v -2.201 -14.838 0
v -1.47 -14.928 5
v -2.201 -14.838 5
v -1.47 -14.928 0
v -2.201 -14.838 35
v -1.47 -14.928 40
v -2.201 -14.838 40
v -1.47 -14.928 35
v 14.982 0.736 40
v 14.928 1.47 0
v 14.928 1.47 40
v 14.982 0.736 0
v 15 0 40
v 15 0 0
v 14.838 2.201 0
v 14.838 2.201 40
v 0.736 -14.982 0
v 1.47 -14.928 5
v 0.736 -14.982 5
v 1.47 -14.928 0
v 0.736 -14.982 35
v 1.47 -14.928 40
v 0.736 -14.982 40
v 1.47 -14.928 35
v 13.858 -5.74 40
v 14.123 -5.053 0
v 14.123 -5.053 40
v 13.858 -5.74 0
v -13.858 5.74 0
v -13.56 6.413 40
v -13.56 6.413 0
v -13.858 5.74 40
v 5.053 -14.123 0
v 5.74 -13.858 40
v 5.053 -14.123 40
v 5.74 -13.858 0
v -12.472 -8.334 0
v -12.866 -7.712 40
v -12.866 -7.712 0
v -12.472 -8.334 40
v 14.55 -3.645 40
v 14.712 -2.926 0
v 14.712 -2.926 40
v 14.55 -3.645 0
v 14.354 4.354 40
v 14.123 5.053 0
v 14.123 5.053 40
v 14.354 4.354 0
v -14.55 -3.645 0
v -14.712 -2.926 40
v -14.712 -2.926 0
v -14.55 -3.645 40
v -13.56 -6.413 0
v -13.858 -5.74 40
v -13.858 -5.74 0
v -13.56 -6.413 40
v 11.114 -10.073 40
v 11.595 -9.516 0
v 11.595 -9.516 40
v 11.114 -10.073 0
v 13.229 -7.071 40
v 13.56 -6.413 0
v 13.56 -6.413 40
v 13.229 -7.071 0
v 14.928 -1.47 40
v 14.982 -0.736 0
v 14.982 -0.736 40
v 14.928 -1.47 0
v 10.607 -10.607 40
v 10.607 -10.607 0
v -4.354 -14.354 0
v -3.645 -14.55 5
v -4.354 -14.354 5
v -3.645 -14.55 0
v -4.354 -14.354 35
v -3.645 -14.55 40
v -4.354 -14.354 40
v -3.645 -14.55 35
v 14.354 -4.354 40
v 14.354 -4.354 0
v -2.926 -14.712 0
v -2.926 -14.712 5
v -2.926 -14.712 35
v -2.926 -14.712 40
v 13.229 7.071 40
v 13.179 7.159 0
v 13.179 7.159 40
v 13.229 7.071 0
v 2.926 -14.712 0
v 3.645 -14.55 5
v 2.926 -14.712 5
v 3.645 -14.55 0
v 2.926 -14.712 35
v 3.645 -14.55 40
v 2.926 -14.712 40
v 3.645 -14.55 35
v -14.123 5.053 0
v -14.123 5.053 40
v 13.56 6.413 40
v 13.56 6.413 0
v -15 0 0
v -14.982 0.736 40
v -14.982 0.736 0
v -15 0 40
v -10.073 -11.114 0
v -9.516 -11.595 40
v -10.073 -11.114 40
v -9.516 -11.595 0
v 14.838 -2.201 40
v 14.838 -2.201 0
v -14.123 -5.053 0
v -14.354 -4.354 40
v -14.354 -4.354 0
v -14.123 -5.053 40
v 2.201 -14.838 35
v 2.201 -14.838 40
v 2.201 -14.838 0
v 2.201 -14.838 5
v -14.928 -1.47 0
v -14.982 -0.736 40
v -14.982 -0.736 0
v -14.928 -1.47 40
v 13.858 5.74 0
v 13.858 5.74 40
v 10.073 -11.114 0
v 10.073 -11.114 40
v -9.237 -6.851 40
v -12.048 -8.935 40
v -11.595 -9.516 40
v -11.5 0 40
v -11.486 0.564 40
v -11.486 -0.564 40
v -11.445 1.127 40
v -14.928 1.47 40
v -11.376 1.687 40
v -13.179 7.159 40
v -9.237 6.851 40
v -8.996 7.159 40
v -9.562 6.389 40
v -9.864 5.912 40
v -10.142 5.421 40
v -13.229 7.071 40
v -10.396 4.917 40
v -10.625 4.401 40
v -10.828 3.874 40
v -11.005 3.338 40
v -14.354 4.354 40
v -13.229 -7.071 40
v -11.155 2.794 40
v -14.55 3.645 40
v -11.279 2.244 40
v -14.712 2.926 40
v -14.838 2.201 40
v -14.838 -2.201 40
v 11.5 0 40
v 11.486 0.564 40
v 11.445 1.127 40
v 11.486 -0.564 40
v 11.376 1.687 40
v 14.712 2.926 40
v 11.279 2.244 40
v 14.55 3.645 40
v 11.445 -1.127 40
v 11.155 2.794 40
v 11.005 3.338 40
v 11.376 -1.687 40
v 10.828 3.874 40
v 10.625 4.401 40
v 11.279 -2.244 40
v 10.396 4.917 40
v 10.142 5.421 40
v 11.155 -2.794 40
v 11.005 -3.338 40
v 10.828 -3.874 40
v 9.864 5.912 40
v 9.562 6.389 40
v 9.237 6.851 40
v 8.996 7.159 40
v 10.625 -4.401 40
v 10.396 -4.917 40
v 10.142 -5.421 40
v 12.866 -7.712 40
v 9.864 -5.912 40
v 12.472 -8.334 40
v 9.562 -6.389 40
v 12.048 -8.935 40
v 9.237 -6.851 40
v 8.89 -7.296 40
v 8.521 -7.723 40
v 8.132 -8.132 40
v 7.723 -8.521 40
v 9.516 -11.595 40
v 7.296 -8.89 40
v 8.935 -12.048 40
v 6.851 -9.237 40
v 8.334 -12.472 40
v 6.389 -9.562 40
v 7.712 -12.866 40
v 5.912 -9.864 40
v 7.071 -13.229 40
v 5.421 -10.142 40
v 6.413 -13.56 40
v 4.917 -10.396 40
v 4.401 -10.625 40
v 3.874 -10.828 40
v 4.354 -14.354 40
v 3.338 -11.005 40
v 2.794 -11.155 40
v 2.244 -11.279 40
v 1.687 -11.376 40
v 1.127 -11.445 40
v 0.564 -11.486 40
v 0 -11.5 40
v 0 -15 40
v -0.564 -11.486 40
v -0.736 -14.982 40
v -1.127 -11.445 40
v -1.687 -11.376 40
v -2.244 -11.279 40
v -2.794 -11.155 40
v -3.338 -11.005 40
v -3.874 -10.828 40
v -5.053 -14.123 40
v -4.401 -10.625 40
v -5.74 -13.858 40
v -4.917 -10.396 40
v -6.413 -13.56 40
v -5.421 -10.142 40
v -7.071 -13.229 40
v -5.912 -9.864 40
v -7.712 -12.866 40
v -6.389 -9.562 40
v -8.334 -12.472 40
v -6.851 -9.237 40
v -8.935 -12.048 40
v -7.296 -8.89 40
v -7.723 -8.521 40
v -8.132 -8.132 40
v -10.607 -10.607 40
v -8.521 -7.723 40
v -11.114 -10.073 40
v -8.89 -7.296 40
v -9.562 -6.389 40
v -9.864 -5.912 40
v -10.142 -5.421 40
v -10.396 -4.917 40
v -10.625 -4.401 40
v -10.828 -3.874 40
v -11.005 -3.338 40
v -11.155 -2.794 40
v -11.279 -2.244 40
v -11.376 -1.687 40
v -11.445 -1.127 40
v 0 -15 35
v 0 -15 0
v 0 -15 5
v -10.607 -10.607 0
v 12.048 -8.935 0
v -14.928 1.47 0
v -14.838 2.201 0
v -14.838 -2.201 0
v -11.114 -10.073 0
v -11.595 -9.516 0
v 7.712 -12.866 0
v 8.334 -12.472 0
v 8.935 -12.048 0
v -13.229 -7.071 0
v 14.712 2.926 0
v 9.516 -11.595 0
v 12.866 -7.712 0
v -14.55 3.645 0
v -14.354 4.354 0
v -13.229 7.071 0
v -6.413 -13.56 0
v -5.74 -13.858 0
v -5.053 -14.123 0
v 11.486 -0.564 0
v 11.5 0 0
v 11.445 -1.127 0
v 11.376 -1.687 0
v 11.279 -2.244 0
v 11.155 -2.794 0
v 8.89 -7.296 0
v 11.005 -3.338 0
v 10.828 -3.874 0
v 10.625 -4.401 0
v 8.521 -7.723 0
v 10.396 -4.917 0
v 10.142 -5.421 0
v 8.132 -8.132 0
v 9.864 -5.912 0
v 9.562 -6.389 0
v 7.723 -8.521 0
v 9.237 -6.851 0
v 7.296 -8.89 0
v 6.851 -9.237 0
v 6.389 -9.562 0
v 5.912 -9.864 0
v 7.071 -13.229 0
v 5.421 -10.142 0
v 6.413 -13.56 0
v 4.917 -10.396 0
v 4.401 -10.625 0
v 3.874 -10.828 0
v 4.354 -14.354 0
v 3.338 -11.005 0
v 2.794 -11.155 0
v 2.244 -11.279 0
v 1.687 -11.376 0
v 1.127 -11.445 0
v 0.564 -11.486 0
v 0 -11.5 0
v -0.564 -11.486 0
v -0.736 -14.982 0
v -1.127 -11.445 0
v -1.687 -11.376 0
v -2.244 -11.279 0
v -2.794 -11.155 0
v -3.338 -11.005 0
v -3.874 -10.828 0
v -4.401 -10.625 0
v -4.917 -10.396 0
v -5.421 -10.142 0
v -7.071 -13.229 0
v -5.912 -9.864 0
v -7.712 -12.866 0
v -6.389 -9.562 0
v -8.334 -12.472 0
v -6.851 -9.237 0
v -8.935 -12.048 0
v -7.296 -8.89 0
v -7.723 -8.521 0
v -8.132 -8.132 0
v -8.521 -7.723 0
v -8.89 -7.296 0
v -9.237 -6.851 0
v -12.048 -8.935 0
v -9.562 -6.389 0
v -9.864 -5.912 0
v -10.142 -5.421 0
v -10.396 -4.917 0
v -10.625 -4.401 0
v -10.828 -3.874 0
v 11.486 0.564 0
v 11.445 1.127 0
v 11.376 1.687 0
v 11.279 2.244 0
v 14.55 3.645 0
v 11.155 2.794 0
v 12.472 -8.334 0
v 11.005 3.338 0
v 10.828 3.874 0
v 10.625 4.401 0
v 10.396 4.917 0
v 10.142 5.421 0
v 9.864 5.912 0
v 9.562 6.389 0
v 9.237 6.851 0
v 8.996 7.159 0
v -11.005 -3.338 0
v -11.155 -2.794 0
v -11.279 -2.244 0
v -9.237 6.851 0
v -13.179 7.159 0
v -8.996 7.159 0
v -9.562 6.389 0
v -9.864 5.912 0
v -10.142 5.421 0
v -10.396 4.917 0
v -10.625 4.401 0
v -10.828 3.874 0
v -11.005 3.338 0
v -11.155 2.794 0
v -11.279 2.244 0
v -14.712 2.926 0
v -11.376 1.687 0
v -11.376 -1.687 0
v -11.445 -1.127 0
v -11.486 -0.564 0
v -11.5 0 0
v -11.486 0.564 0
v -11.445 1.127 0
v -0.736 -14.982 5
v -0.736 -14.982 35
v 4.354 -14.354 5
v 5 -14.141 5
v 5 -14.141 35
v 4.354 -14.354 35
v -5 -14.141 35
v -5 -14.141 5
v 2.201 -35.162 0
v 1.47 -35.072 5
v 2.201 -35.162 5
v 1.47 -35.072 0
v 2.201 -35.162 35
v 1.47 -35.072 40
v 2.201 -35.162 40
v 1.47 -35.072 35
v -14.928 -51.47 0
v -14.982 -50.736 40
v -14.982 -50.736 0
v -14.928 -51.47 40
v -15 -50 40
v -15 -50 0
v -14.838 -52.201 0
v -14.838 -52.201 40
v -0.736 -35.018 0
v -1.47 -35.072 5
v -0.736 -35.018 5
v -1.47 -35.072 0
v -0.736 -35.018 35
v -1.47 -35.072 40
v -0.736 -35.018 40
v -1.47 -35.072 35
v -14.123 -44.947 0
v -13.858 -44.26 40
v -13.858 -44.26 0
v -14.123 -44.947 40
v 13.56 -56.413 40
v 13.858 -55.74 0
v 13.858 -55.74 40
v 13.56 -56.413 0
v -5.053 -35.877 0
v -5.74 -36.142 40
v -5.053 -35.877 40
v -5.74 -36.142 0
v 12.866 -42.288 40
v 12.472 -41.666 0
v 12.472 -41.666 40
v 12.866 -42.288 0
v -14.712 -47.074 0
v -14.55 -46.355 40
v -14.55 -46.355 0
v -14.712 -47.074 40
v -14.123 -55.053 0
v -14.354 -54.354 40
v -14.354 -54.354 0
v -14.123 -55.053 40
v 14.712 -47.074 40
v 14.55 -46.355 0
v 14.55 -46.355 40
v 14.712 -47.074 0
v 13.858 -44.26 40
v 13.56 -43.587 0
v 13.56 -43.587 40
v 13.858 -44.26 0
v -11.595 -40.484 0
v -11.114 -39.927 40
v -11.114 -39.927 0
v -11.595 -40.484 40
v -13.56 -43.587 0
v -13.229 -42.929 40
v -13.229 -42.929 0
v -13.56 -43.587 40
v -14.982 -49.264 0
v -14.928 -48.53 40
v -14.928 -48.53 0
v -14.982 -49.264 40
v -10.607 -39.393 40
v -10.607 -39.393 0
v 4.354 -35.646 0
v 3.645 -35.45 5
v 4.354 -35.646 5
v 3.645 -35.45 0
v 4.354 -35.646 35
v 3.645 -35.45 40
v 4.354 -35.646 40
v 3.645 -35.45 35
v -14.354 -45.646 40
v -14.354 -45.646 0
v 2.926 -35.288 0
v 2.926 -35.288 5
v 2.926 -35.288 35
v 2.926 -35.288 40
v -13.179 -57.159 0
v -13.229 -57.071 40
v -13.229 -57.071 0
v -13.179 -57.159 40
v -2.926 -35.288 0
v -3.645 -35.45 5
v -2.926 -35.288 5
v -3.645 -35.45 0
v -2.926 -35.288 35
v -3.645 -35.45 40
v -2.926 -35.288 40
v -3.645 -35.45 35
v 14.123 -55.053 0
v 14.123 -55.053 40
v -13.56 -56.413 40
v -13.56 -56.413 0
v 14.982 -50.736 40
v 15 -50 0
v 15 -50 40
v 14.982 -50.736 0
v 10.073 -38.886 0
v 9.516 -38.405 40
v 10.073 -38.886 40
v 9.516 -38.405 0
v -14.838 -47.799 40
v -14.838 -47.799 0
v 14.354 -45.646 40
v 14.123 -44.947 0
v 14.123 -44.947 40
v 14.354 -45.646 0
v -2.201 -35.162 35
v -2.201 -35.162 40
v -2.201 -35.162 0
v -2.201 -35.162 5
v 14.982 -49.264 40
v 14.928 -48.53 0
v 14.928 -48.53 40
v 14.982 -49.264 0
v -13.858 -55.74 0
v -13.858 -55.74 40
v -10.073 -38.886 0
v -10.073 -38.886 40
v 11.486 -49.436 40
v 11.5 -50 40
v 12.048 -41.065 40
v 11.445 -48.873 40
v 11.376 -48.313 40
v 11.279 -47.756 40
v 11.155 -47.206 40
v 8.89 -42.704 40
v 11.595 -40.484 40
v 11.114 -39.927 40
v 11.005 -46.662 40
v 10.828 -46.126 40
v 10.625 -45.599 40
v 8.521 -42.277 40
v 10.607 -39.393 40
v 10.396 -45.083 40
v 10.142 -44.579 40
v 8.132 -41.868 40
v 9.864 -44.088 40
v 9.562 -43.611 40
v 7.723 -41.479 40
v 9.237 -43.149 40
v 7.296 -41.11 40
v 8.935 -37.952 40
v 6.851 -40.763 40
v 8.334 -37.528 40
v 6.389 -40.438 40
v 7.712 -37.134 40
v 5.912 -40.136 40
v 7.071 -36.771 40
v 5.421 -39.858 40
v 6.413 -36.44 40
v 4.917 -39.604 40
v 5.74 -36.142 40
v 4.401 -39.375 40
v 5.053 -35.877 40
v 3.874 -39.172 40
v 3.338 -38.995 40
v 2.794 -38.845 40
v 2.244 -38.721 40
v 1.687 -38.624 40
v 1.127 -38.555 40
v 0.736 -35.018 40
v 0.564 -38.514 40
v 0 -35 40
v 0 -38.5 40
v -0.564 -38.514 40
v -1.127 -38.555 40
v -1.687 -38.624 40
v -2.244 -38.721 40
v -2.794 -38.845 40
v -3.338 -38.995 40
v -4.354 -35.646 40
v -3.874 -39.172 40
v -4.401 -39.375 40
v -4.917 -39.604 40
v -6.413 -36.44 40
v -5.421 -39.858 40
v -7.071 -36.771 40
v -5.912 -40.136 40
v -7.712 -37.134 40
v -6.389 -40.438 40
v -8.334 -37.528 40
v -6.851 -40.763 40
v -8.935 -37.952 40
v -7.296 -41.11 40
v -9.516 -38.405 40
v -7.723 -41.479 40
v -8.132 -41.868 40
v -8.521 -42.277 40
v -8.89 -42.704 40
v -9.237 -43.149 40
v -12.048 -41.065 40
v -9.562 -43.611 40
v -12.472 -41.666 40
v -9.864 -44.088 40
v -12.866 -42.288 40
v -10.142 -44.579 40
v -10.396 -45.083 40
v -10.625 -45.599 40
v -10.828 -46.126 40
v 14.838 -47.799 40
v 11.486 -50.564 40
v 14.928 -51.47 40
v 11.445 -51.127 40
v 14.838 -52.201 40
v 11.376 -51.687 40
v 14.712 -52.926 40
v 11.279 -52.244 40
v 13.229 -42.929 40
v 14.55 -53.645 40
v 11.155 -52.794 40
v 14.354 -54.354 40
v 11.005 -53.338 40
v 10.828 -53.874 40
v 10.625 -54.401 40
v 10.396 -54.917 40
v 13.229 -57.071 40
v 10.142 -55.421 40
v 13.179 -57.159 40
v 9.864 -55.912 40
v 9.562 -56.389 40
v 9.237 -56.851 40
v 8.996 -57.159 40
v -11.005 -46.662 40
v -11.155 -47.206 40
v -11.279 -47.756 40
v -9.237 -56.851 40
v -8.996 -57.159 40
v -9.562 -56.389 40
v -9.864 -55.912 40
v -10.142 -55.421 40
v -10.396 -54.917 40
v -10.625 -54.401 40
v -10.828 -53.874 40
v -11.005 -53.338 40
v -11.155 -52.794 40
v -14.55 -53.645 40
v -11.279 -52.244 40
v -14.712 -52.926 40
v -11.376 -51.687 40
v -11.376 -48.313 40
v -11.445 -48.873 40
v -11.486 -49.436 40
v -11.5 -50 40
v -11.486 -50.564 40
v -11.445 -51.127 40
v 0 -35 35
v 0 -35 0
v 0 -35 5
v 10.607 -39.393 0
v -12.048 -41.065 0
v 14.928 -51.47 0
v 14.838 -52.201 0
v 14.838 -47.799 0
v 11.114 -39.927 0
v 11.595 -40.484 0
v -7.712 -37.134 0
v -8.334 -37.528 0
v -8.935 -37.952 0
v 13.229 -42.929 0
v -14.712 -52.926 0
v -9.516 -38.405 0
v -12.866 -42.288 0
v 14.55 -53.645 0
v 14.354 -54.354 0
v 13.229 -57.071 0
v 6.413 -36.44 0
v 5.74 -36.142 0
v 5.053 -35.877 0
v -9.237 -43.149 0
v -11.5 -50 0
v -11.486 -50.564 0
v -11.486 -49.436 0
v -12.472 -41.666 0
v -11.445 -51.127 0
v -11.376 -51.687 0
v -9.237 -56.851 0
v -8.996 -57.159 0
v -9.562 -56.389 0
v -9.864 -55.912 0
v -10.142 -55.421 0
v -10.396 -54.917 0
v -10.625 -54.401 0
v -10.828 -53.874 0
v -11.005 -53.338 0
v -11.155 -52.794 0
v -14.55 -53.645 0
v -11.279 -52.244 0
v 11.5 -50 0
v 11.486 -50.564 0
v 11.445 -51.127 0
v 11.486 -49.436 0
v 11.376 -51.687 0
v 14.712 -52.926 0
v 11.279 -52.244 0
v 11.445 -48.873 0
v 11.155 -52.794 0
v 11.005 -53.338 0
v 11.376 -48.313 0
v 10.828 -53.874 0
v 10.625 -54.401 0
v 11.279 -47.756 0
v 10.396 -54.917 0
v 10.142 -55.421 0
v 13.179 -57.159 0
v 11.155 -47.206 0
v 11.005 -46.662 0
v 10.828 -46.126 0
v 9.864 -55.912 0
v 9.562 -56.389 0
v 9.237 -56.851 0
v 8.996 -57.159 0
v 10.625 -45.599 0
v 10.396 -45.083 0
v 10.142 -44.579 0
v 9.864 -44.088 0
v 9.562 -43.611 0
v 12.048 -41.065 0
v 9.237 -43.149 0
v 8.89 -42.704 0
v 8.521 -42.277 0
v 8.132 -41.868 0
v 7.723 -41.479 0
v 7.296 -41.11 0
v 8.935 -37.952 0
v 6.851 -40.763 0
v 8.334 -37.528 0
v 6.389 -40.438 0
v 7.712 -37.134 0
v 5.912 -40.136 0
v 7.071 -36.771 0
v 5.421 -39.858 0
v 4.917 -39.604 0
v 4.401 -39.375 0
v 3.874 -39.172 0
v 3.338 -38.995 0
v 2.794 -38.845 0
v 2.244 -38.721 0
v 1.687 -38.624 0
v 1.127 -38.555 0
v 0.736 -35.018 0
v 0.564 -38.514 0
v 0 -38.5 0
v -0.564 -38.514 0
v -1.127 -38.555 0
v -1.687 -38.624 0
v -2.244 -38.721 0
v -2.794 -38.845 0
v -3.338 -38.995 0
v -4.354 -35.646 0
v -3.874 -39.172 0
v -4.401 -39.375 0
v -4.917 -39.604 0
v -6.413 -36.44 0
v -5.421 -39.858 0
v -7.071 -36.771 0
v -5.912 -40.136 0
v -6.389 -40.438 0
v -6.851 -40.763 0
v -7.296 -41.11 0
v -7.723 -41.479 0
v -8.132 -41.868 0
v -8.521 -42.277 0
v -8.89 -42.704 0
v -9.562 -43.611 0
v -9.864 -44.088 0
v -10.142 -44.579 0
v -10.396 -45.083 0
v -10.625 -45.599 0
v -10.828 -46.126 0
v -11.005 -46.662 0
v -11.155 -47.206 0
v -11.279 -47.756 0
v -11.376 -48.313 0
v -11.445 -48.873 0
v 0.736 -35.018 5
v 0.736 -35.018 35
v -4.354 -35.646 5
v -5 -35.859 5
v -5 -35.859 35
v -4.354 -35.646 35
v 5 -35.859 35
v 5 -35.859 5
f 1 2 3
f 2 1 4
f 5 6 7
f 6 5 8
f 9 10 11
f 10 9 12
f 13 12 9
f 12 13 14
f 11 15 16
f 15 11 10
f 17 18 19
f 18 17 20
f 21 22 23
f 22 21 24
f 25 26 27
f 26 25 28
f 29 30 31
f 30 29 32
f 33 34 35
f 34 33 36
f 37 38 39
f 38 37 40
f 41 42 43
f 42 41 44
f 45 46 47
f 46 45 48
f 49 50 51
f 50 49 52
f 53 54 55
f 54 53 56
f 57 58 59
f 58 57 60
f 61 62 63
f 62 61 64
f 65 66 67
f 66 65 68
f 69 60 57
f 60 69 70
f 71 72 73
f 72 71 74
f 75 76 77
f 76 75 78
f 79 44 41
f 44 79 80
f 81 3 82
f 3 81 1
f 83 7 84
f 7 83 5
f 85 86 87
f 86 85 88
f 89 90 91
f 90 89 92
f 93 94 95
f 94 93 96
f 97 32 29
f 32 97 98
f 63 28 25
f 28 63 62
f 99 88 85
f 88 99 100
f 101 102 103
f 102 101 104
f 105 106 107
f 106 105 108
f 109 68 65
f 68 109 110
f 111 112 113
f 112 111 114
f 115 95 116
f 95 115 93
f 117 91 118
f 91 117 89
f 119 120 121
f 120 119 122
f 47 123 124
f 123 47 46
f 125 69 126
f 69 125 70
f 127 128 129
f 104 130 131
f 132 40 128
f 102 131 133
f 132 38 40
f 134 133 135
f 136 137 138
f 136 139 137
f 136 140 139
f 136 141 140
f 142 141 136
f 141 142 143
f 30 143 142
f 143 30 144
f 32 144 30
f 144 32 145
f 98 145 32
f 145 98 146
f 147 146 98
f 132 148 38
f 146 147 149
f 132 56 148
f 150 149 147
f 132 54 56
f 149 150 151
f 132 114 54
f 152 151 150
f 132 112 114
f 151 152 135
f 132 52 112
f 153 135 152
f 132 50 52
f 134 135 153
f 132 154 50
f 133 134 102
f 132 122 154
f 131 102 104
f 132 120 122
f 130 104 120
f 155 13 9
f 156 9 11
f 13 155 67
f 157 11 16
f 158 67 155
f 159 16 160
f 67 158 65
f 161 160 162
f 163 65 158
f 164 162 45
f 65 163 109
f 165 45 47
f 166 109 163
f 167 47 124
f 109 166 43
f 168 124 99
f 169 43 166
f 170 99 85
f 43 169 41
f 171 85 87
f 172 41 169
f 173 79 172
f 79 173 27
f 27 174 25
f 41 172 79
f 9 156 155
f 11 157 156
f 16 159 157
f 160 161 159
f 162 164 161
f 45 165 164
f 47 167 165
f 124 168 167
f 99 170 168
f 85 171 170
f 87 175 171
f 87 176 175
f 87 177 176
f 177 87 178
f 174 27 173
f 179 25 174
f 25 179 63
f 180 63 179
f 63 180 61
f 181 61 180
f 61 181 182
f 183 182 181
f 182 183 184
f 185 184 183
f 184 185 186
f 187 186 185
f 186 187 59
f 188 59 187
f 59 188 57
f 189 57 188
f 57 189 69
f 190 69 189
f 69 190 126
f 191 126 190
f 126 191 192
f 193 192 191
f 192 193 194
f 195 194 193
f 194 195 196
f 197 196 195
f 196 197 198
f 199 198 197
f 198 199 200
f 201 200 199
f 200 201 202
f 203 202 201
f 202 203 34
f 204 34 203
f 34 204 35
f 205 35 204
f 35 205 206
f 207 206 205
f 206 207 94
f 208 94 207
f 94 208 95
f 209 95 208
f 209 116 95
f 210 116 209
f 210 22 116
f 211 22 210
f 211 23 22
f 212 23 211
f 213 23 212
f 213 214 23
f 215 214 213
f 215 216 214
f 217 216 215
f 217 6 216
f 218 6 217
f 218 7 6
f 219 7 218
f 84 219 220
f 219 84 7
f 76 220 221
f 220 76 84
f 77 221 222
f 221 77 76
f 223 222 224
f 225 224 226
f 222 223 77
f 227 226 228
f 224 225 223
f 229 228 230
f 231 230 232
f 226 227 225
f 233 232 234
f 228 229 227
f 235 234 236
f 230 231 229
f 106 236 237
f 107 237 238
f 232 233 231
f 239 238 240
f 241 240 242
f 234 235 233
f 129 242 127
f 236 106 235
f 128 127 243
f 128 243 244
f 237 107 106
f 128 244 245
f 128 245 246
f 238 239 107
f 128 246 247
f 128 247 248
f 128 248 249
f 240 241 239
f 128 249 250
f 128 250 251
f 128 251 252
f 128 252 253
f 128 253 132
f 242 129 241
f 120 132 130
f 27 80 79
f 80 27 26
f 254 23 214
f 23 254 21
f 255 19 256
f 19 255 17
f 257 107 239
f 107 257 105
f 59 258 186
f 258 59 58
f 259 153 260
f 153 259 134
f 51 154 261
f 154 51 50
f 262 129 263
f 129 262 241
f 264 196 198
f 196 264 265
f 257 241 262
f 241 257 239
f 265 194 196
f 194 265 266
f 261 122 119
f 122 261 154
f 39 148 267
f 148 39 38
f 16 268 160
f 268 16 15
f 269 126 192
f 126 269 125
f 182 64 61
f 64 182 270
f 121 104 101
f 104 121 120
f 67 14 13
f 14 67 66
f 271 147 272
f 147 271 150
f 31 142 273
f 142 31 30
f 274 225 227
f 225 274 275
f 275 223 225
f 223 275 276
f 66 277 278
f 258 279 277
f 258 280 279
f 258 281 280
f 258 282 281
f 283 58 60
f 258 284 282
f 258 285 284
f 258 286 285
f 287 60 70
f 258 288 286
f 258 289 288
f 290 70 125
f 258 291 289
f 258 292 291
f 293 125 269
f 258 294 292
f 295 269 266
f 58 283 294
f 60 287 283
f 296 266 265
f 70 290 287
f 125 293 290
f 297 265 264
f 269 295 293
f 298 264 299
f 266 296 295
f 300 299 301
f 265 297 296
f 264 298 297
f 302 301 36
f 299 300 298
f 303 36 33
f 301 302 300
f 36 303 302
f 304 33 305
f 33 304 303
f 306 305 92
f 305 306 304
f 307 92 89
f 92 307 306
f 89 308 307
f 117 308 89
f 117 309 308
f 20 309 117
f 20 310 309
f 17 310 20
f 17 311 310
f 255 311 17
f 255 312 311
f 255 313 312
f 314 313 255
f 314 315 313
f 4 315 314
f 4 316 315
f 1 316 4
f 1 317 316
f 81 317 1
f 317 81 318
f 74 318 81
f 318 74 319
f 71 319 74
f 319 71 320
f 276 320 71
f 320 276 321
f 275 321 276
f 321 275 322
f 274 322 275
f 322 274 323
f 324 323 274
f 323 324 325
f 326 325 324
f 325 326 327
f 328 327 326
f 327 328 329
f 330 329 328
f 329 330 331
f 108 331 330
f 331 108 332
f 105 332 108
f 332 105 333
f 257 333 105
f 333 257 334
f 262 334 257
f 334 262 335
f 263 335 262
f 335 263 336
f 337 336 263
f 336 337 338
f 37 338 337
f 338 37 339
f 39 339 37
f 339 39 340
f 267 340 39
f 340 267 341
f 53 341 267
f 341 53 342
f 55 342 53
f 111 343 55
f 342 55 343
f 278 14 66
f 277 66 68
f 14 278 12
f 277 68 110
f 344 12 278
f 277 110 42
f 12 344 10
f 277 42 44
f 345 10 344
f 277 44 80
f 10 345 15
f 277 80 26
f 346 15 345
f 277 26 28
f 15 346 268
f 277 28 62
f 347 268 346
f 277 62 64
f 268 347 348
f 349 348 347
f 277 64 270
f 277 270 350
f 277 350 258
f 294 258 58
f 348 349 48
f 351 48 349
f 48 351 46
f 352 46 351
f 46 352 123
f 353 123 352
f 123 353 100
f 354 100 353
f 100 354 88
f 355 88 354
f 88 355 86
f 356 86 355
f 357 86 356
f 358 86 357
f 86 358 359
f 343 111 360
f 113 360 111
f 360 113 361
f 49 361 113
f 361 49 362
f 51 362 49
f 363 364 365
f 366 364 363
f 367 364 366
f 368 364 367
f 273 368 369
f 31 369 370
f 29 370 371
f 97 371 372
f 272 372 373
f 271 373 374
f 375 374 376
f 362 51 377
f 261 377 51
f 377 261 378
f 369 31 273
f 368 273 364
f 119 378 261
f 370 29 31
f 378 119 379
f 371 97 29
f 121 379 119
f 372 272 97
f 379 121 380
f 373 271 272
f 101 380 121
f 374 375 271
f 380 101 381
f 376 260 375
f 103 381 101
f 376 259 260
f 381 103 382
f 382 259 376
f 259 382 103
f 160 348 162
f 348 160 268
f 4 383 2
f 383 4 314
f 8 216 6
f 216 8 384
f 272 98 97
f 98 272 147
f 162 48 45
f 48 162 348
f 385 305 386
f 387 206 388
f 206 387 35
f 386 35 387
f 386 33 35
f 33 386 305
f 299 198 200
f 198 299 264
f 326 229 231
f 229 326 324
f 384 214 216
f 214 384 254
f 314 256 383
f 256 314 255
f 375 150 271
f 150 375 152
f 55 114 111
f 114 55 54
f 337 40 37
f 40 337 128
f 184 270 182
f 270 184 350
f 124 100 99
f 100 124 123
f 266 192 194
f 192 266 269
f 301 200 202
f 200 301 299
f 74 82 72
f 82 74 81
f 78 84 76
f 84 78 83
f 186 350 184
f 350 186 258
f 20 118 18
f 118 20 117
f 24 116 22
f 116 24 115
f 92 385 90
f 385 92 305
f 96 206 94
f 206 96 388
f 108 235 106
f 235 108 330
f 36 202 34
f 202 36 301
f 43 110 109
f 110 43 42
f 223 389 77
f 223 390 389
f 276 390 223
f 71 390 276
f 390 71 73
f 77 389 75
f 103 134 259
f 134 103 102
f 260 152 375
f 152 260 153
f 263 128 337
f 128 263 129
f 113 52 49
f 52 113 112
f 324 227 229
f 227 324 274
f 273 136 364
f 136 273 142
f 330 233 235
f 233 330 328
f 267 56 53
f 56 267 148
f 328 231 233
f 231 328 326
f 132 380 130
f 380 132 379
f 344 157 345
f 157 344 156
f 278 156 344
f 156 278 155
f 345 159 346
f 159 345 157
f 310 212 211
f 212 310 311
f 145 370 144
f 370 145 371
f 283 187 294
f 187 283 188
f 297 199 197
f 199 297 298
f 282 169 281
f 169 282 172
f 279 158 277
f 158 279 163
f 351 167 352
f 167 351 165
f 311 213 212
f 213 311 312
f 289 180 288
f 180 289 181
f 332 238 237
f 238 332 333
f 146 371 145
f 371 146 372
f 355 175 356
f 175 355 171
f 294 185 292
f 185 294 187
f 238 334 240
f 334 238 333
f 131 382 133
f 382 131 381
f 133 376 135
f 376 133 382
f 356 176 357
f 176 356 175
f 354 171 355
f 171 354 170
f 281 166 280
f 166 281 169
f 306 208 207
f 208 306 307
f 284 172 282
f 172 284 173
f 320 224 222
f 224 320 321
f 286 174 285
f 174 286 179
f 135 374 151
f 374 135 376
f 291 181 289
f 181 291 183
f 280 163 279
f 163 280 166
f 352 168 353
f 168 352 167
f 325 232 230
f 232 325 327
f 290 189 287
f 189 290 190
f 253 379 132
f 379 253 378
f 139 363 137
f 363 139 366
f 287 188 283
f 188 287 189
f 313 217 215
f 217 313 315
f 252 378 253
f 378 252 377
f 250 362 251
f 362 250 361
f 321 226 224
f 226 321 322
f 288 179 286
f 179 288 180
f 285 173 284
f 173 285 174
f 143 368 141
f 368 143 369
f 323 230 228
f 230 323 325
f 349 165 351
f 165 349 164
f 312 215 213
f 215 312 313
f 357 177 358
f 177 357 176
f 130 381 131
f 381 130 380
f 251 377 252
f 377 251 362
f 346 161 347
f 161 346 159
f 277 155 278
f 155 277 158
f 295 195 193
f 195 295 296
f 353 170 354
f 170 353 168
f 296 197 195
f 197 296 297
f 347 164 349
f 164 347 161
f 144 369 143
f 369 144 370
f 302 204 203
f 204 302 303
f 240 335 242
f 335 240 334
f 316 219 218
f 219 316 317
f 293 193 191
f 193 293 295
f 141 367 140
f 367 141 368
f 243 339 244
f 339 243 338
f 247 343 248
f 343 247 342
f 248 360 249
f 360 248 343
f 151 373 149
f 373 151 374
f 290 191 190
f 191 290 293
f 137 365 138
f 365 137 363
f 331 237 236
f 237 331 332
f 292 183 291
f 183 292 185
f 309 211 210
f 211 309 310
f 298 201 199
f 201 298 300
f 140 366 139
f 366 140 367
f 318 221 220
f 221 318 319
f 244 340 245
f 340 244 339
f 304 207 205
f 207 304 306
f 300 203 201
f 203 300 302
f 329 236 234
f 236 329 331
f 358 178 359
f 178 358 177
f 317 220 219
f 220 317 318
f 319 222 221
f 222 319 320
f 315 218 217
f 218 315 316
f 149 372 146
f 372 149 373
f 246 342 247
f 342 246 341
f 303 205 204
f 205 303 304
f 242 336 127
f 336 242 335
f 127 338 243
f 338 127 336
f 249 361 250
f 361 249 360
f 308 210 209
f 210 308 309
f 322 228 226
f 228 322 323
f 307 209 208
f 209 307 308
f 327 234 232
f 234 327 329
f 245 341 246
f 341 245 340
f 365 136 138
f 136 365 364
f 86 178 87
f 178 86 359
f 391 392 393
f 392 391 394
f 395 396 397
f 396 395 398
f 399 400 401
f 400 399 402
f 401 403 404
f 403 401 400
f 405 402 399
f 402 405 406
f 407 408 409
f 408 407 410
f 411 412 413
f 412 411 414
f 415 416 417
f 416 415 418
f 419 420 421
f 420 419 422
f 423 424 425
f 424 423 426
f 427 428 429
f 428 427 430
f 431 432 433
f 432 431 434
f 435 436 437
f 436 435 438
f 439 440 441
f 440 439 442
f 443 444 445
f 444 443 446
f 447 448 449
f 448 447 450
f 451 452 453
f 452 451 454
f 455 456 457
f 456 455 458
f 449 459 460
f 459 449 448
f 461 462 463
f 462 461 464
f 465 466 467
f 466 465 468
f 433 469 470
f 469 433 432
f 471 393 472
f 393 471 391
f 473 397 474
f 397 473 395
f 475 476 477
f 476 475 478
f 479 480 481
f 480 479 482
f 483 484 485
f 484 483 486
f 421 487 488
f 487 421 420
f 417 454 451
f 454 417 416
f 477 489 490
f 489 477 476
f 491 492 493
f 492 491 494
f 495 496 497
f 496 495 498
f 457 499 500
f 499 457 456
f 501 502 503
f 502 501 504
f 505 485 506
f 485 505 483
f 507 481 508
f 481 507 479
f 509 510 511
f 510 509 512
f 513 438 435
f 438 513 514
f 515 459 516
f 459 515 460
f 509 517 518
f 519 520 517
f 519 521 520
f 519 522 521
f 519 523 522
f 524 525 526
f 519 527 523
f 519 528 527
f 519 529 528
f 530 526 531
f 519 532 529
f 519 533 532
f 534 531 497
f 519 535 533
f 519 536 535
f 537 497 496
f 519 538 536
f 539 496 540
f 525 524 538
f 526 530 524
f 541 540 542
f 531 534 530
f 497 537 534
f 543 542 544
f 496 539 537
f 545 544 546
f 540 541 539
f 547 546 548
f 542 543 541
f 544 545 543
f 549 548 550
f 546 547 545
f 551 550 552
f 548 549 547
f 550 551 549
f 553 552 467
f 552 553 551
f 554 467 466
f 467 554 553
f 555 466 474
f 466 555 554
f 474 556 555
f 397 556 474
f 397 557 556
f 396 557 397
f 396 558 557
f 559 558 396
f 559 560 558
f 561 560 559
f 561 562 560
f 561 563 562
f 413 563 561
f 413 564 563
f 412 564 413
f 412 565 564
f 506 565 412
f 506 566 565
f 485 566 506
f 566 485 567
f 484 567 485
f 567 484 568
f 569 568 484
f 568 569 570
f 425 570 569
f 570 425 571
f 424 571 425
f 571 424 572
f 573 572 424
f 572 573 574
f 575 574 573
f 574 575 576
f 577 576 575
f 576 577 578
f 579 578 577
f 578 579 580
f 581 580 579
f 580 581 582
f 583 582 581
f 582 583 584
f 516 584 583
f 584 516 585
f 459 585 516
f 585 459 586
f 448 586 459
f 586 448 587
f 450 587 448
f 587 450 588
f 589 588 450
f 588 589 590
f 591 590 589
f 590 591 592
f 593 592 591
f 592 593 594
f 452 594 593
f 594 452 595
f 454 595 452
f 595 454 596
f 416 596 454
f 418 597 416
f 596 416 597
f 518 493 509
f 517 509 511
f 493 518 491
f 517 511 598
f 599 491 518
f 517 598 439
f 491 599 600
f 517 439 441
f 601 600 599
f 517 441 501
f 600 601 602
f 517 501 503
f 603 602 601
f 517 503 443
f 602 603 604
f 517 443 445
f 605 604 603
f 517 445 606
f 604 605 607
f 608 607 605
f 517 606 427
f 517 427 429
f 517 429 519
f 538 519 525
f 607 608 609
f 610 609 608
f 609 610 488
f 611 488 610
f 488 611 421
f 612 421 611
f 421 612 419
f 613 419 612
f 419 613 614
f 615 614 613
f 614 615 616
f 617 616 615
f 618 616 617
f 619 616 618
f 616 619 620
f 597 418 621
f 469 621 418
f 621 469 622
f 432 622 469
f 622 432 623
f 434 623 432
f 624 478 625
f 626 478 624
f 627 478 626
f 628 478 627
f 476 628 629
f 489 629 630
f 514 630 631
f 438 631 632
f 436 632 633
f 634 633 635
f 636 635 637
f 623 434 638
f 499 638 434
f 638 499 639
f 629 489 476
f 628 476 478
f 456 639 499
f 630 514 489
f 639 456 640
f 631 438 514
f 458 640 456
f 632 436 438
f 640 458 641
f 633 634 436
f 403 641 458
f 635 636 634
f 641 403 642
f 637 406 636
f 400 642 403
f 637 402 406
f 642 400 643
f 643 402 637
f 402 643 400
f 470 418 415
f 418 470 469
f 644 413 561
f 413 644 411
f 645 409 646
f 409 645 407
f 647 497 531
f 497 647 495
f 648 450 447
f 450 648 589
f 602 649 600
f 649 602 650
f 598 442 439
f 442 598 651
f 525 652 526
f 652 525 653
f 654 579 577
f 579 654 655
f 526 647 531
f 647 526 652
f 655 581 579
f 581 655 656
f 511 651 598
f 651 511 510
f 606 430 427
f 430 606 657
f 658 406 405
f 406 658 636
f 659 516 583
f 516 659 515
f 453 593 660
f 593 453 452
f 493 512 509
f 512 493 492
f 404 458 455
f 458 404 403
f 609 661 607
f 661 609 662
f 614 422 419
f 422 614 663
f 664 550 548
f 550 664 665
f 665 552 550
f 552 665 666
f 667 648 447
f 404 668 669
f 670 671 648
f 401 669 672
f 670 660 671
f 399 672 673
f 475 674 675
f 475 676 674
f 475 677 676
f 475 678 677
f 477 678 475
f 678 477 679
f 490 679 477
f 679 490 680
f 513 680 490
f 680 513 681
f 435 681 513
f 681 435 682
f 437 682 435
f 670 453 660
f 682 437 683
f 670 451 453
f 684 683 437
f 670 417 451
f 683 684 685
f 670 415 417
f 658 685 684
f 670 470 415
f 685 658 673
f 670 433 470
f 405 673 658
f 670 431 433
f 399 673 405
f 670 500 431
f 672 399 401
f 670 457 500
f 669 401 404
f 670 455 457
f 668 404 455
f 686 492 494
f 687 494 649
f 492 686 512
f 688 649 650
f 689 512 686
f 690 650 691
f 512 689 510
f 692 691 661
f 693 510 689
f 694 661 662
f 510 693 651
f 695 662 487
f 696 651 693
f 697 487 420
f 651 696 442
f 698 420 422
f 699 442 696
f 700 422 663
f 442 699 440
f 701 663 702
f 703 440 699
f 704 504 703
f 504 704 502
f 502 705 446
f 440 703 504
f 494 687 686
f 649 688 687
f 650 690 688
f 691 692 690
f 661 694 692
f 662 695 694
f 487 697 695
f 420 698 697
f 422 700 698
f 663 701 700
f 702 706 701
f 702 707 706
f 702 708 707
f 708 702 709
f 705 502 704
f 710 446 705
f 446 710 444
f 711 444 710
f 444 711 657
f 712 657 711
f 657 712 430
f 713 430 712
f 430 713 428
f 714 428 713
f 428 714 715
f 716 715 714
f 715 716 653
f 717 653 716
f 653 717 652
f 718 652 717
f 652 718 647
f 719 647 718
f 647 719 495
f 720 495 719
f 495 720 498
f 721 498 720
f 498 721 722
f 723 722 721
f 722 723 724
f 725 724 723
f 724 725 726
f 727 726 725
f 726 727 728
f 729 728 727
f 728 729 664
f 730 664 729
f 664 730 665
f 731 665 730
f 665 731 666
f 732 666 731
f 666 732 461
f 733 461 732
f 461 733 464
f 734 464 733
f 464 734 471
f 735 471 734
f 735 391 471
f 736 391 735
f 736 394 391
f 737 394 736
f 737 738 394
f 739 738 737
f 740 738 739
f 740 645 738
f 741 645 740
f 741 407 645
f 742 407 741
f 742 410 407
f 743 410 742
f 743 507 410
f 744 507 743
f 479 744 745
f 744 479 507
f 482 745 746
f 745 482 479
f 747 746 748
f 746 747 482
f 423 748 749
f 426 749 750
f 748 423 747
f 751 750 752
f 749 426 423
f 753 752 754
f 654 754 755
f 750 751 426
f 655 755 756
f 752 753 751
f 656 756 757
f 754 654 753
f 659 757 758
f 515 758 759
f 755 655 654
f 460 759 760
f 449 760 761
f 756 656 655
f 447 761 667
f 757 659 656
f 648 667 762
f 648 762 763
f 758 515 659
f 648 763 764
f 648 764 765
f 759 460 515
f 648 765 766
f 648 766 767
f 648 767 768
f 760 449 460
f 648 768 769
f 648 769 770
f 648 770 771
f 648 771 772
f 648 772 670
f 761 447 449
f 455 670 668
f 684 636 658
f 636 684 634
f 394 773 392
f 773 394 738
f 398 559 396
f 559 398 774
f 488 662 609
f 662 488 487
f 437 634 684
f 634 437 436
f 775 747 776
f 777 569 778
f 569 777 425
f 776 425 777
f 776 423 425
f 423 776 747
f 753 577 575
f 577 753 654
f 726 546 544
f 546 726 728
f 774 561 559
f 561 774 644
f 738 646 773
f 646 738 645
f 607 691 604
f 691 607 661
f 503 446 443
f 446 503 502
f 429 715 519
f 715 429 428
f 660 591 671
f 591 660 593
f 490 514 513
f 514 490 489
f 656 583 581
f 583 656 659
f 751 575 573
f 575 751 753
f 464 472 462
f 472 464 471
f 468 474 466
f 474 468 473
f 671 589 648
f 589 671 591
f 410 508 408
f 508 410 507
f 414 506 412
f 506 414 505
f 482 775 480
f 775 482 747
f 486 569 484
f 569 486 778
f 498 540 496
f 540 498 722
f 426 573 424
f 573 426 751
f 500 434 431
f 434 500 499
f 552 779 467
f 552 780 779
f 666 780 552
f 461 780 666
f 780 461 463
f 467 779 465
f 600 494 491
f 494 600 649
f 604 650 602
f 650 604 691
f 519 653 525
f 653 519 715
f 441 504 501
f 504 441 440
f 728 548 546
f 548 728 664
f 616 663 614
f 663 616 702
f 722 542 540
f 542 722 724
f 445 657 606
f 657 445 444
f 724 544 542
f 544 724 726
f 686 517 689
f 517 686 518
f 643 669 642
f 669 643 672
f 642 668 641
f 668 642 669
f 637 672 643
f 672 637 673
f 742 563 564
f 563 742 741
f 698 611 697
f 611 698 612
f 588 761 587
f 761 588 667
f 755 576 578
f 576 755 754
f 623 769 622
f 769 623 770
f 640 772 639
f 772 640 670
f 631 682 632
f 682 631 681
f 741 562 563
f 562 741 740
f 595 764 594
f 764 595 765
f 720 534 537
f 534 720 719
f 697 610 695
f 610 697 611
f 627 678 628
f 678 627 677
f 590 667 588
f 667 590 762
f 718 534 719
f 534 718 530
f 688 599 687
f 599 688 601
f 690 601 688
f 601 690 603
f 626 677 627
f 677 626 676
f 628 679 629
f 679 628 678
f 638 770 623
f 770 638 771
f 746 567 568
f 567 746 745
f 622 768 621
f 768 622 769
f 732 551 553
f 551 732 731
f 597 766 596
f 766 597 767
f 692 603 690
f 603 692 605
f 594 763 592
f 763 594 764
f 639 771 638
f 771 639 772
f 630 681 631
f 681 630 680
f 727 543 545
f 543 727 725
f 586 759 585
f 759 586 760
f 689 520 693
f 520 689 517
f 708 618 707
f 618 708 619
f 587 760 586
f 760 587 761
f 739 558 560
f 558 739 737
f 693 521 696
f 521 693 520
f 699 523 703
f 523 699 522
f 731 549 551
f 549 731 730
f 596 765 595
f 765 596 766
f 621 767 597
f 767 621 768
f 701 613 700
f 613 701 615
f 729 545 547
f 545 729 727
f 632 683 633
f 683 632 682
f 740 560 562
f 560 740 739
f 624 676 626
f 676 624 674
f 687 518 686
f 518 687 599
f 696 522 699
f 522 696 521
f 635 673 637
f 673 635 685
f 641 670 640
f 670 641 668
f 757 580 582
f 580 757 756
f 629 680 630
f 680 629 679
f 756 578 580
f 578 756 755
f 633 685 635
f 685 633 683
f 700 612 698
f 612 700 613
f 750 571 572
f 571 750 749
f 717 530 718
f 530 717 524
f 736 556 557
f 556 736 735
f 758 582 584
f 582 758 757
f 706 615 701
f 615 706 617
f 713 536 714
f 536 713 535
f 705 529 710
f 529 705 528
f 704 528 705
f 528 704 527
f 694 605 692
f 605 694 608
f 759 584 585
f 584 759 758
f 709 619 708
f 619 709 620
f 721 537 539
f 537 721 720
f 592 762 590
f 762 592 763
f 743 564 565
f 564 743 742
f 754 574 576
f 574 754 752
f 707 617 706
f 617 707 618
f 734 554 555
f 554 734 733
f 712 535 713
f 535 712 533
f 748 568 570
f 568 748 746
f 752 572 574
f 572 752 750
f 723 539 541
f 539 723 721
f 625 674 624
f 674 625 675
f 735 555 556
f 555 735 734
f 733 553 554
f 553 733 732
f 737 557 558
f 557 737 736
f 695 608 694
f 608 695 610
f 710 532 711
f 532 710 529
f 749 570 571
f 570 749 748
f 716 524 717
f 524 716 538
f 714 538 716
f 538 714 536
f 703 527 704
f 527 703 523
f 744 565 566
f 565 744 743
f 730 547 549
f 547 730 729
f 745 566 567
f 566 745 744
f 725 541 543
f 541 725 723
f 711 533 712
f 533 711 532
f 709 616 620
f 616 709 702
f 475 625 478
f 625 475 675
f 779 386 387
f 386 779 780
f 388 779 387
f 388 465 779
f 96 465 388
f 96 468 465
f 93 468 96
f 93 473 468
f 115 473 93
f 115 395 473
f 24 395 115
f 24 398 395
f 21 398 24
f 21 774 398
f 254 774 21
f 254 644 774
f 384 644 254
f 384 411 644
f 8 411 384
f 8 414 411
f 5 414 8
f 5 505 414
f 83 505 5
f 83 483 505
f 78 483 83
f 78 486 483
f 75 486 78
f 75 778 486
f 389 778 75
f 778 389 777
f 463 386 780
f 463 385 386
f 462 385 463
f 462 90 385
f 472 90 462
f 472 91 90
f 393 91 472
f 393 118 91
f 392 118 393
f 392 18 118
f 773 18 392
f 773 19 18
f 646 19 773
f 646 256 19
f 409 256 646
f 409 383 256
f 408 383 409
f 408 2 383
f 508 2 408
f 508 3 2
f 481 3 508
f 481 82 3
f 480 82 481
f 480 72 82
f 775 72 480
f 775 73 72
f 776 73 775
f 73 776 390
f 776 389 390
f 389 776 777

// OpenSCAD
eps=0.01;
$fn=128;

module clip(din = 23, wall=4, open=18, h=30) {
    _off = sqrt((din/2)^2 - (open/2) ^2 );
    _dout = din + 2*wall;
    echo(_off, _dout);
    difference() {
        cylinder(h=h, d=_dout);
        translate([0, 0, -eps]) cylinder(h=h+2*eps, d=din);
        translate([-_dout/2, _off, -eps]) cube([_dout, _dout, h+2*eps]);
        
    }
}
union() {
    clip(din=23, wall=3.5, open=18, h=40);
    translate([0, -50, 0])
        rotate([0, 0, 180])
        clip(din=23, wall=3.5, open=18, h=40);
    translate([-5, -37, 5])
        cube([10, 24, 30]);
}
